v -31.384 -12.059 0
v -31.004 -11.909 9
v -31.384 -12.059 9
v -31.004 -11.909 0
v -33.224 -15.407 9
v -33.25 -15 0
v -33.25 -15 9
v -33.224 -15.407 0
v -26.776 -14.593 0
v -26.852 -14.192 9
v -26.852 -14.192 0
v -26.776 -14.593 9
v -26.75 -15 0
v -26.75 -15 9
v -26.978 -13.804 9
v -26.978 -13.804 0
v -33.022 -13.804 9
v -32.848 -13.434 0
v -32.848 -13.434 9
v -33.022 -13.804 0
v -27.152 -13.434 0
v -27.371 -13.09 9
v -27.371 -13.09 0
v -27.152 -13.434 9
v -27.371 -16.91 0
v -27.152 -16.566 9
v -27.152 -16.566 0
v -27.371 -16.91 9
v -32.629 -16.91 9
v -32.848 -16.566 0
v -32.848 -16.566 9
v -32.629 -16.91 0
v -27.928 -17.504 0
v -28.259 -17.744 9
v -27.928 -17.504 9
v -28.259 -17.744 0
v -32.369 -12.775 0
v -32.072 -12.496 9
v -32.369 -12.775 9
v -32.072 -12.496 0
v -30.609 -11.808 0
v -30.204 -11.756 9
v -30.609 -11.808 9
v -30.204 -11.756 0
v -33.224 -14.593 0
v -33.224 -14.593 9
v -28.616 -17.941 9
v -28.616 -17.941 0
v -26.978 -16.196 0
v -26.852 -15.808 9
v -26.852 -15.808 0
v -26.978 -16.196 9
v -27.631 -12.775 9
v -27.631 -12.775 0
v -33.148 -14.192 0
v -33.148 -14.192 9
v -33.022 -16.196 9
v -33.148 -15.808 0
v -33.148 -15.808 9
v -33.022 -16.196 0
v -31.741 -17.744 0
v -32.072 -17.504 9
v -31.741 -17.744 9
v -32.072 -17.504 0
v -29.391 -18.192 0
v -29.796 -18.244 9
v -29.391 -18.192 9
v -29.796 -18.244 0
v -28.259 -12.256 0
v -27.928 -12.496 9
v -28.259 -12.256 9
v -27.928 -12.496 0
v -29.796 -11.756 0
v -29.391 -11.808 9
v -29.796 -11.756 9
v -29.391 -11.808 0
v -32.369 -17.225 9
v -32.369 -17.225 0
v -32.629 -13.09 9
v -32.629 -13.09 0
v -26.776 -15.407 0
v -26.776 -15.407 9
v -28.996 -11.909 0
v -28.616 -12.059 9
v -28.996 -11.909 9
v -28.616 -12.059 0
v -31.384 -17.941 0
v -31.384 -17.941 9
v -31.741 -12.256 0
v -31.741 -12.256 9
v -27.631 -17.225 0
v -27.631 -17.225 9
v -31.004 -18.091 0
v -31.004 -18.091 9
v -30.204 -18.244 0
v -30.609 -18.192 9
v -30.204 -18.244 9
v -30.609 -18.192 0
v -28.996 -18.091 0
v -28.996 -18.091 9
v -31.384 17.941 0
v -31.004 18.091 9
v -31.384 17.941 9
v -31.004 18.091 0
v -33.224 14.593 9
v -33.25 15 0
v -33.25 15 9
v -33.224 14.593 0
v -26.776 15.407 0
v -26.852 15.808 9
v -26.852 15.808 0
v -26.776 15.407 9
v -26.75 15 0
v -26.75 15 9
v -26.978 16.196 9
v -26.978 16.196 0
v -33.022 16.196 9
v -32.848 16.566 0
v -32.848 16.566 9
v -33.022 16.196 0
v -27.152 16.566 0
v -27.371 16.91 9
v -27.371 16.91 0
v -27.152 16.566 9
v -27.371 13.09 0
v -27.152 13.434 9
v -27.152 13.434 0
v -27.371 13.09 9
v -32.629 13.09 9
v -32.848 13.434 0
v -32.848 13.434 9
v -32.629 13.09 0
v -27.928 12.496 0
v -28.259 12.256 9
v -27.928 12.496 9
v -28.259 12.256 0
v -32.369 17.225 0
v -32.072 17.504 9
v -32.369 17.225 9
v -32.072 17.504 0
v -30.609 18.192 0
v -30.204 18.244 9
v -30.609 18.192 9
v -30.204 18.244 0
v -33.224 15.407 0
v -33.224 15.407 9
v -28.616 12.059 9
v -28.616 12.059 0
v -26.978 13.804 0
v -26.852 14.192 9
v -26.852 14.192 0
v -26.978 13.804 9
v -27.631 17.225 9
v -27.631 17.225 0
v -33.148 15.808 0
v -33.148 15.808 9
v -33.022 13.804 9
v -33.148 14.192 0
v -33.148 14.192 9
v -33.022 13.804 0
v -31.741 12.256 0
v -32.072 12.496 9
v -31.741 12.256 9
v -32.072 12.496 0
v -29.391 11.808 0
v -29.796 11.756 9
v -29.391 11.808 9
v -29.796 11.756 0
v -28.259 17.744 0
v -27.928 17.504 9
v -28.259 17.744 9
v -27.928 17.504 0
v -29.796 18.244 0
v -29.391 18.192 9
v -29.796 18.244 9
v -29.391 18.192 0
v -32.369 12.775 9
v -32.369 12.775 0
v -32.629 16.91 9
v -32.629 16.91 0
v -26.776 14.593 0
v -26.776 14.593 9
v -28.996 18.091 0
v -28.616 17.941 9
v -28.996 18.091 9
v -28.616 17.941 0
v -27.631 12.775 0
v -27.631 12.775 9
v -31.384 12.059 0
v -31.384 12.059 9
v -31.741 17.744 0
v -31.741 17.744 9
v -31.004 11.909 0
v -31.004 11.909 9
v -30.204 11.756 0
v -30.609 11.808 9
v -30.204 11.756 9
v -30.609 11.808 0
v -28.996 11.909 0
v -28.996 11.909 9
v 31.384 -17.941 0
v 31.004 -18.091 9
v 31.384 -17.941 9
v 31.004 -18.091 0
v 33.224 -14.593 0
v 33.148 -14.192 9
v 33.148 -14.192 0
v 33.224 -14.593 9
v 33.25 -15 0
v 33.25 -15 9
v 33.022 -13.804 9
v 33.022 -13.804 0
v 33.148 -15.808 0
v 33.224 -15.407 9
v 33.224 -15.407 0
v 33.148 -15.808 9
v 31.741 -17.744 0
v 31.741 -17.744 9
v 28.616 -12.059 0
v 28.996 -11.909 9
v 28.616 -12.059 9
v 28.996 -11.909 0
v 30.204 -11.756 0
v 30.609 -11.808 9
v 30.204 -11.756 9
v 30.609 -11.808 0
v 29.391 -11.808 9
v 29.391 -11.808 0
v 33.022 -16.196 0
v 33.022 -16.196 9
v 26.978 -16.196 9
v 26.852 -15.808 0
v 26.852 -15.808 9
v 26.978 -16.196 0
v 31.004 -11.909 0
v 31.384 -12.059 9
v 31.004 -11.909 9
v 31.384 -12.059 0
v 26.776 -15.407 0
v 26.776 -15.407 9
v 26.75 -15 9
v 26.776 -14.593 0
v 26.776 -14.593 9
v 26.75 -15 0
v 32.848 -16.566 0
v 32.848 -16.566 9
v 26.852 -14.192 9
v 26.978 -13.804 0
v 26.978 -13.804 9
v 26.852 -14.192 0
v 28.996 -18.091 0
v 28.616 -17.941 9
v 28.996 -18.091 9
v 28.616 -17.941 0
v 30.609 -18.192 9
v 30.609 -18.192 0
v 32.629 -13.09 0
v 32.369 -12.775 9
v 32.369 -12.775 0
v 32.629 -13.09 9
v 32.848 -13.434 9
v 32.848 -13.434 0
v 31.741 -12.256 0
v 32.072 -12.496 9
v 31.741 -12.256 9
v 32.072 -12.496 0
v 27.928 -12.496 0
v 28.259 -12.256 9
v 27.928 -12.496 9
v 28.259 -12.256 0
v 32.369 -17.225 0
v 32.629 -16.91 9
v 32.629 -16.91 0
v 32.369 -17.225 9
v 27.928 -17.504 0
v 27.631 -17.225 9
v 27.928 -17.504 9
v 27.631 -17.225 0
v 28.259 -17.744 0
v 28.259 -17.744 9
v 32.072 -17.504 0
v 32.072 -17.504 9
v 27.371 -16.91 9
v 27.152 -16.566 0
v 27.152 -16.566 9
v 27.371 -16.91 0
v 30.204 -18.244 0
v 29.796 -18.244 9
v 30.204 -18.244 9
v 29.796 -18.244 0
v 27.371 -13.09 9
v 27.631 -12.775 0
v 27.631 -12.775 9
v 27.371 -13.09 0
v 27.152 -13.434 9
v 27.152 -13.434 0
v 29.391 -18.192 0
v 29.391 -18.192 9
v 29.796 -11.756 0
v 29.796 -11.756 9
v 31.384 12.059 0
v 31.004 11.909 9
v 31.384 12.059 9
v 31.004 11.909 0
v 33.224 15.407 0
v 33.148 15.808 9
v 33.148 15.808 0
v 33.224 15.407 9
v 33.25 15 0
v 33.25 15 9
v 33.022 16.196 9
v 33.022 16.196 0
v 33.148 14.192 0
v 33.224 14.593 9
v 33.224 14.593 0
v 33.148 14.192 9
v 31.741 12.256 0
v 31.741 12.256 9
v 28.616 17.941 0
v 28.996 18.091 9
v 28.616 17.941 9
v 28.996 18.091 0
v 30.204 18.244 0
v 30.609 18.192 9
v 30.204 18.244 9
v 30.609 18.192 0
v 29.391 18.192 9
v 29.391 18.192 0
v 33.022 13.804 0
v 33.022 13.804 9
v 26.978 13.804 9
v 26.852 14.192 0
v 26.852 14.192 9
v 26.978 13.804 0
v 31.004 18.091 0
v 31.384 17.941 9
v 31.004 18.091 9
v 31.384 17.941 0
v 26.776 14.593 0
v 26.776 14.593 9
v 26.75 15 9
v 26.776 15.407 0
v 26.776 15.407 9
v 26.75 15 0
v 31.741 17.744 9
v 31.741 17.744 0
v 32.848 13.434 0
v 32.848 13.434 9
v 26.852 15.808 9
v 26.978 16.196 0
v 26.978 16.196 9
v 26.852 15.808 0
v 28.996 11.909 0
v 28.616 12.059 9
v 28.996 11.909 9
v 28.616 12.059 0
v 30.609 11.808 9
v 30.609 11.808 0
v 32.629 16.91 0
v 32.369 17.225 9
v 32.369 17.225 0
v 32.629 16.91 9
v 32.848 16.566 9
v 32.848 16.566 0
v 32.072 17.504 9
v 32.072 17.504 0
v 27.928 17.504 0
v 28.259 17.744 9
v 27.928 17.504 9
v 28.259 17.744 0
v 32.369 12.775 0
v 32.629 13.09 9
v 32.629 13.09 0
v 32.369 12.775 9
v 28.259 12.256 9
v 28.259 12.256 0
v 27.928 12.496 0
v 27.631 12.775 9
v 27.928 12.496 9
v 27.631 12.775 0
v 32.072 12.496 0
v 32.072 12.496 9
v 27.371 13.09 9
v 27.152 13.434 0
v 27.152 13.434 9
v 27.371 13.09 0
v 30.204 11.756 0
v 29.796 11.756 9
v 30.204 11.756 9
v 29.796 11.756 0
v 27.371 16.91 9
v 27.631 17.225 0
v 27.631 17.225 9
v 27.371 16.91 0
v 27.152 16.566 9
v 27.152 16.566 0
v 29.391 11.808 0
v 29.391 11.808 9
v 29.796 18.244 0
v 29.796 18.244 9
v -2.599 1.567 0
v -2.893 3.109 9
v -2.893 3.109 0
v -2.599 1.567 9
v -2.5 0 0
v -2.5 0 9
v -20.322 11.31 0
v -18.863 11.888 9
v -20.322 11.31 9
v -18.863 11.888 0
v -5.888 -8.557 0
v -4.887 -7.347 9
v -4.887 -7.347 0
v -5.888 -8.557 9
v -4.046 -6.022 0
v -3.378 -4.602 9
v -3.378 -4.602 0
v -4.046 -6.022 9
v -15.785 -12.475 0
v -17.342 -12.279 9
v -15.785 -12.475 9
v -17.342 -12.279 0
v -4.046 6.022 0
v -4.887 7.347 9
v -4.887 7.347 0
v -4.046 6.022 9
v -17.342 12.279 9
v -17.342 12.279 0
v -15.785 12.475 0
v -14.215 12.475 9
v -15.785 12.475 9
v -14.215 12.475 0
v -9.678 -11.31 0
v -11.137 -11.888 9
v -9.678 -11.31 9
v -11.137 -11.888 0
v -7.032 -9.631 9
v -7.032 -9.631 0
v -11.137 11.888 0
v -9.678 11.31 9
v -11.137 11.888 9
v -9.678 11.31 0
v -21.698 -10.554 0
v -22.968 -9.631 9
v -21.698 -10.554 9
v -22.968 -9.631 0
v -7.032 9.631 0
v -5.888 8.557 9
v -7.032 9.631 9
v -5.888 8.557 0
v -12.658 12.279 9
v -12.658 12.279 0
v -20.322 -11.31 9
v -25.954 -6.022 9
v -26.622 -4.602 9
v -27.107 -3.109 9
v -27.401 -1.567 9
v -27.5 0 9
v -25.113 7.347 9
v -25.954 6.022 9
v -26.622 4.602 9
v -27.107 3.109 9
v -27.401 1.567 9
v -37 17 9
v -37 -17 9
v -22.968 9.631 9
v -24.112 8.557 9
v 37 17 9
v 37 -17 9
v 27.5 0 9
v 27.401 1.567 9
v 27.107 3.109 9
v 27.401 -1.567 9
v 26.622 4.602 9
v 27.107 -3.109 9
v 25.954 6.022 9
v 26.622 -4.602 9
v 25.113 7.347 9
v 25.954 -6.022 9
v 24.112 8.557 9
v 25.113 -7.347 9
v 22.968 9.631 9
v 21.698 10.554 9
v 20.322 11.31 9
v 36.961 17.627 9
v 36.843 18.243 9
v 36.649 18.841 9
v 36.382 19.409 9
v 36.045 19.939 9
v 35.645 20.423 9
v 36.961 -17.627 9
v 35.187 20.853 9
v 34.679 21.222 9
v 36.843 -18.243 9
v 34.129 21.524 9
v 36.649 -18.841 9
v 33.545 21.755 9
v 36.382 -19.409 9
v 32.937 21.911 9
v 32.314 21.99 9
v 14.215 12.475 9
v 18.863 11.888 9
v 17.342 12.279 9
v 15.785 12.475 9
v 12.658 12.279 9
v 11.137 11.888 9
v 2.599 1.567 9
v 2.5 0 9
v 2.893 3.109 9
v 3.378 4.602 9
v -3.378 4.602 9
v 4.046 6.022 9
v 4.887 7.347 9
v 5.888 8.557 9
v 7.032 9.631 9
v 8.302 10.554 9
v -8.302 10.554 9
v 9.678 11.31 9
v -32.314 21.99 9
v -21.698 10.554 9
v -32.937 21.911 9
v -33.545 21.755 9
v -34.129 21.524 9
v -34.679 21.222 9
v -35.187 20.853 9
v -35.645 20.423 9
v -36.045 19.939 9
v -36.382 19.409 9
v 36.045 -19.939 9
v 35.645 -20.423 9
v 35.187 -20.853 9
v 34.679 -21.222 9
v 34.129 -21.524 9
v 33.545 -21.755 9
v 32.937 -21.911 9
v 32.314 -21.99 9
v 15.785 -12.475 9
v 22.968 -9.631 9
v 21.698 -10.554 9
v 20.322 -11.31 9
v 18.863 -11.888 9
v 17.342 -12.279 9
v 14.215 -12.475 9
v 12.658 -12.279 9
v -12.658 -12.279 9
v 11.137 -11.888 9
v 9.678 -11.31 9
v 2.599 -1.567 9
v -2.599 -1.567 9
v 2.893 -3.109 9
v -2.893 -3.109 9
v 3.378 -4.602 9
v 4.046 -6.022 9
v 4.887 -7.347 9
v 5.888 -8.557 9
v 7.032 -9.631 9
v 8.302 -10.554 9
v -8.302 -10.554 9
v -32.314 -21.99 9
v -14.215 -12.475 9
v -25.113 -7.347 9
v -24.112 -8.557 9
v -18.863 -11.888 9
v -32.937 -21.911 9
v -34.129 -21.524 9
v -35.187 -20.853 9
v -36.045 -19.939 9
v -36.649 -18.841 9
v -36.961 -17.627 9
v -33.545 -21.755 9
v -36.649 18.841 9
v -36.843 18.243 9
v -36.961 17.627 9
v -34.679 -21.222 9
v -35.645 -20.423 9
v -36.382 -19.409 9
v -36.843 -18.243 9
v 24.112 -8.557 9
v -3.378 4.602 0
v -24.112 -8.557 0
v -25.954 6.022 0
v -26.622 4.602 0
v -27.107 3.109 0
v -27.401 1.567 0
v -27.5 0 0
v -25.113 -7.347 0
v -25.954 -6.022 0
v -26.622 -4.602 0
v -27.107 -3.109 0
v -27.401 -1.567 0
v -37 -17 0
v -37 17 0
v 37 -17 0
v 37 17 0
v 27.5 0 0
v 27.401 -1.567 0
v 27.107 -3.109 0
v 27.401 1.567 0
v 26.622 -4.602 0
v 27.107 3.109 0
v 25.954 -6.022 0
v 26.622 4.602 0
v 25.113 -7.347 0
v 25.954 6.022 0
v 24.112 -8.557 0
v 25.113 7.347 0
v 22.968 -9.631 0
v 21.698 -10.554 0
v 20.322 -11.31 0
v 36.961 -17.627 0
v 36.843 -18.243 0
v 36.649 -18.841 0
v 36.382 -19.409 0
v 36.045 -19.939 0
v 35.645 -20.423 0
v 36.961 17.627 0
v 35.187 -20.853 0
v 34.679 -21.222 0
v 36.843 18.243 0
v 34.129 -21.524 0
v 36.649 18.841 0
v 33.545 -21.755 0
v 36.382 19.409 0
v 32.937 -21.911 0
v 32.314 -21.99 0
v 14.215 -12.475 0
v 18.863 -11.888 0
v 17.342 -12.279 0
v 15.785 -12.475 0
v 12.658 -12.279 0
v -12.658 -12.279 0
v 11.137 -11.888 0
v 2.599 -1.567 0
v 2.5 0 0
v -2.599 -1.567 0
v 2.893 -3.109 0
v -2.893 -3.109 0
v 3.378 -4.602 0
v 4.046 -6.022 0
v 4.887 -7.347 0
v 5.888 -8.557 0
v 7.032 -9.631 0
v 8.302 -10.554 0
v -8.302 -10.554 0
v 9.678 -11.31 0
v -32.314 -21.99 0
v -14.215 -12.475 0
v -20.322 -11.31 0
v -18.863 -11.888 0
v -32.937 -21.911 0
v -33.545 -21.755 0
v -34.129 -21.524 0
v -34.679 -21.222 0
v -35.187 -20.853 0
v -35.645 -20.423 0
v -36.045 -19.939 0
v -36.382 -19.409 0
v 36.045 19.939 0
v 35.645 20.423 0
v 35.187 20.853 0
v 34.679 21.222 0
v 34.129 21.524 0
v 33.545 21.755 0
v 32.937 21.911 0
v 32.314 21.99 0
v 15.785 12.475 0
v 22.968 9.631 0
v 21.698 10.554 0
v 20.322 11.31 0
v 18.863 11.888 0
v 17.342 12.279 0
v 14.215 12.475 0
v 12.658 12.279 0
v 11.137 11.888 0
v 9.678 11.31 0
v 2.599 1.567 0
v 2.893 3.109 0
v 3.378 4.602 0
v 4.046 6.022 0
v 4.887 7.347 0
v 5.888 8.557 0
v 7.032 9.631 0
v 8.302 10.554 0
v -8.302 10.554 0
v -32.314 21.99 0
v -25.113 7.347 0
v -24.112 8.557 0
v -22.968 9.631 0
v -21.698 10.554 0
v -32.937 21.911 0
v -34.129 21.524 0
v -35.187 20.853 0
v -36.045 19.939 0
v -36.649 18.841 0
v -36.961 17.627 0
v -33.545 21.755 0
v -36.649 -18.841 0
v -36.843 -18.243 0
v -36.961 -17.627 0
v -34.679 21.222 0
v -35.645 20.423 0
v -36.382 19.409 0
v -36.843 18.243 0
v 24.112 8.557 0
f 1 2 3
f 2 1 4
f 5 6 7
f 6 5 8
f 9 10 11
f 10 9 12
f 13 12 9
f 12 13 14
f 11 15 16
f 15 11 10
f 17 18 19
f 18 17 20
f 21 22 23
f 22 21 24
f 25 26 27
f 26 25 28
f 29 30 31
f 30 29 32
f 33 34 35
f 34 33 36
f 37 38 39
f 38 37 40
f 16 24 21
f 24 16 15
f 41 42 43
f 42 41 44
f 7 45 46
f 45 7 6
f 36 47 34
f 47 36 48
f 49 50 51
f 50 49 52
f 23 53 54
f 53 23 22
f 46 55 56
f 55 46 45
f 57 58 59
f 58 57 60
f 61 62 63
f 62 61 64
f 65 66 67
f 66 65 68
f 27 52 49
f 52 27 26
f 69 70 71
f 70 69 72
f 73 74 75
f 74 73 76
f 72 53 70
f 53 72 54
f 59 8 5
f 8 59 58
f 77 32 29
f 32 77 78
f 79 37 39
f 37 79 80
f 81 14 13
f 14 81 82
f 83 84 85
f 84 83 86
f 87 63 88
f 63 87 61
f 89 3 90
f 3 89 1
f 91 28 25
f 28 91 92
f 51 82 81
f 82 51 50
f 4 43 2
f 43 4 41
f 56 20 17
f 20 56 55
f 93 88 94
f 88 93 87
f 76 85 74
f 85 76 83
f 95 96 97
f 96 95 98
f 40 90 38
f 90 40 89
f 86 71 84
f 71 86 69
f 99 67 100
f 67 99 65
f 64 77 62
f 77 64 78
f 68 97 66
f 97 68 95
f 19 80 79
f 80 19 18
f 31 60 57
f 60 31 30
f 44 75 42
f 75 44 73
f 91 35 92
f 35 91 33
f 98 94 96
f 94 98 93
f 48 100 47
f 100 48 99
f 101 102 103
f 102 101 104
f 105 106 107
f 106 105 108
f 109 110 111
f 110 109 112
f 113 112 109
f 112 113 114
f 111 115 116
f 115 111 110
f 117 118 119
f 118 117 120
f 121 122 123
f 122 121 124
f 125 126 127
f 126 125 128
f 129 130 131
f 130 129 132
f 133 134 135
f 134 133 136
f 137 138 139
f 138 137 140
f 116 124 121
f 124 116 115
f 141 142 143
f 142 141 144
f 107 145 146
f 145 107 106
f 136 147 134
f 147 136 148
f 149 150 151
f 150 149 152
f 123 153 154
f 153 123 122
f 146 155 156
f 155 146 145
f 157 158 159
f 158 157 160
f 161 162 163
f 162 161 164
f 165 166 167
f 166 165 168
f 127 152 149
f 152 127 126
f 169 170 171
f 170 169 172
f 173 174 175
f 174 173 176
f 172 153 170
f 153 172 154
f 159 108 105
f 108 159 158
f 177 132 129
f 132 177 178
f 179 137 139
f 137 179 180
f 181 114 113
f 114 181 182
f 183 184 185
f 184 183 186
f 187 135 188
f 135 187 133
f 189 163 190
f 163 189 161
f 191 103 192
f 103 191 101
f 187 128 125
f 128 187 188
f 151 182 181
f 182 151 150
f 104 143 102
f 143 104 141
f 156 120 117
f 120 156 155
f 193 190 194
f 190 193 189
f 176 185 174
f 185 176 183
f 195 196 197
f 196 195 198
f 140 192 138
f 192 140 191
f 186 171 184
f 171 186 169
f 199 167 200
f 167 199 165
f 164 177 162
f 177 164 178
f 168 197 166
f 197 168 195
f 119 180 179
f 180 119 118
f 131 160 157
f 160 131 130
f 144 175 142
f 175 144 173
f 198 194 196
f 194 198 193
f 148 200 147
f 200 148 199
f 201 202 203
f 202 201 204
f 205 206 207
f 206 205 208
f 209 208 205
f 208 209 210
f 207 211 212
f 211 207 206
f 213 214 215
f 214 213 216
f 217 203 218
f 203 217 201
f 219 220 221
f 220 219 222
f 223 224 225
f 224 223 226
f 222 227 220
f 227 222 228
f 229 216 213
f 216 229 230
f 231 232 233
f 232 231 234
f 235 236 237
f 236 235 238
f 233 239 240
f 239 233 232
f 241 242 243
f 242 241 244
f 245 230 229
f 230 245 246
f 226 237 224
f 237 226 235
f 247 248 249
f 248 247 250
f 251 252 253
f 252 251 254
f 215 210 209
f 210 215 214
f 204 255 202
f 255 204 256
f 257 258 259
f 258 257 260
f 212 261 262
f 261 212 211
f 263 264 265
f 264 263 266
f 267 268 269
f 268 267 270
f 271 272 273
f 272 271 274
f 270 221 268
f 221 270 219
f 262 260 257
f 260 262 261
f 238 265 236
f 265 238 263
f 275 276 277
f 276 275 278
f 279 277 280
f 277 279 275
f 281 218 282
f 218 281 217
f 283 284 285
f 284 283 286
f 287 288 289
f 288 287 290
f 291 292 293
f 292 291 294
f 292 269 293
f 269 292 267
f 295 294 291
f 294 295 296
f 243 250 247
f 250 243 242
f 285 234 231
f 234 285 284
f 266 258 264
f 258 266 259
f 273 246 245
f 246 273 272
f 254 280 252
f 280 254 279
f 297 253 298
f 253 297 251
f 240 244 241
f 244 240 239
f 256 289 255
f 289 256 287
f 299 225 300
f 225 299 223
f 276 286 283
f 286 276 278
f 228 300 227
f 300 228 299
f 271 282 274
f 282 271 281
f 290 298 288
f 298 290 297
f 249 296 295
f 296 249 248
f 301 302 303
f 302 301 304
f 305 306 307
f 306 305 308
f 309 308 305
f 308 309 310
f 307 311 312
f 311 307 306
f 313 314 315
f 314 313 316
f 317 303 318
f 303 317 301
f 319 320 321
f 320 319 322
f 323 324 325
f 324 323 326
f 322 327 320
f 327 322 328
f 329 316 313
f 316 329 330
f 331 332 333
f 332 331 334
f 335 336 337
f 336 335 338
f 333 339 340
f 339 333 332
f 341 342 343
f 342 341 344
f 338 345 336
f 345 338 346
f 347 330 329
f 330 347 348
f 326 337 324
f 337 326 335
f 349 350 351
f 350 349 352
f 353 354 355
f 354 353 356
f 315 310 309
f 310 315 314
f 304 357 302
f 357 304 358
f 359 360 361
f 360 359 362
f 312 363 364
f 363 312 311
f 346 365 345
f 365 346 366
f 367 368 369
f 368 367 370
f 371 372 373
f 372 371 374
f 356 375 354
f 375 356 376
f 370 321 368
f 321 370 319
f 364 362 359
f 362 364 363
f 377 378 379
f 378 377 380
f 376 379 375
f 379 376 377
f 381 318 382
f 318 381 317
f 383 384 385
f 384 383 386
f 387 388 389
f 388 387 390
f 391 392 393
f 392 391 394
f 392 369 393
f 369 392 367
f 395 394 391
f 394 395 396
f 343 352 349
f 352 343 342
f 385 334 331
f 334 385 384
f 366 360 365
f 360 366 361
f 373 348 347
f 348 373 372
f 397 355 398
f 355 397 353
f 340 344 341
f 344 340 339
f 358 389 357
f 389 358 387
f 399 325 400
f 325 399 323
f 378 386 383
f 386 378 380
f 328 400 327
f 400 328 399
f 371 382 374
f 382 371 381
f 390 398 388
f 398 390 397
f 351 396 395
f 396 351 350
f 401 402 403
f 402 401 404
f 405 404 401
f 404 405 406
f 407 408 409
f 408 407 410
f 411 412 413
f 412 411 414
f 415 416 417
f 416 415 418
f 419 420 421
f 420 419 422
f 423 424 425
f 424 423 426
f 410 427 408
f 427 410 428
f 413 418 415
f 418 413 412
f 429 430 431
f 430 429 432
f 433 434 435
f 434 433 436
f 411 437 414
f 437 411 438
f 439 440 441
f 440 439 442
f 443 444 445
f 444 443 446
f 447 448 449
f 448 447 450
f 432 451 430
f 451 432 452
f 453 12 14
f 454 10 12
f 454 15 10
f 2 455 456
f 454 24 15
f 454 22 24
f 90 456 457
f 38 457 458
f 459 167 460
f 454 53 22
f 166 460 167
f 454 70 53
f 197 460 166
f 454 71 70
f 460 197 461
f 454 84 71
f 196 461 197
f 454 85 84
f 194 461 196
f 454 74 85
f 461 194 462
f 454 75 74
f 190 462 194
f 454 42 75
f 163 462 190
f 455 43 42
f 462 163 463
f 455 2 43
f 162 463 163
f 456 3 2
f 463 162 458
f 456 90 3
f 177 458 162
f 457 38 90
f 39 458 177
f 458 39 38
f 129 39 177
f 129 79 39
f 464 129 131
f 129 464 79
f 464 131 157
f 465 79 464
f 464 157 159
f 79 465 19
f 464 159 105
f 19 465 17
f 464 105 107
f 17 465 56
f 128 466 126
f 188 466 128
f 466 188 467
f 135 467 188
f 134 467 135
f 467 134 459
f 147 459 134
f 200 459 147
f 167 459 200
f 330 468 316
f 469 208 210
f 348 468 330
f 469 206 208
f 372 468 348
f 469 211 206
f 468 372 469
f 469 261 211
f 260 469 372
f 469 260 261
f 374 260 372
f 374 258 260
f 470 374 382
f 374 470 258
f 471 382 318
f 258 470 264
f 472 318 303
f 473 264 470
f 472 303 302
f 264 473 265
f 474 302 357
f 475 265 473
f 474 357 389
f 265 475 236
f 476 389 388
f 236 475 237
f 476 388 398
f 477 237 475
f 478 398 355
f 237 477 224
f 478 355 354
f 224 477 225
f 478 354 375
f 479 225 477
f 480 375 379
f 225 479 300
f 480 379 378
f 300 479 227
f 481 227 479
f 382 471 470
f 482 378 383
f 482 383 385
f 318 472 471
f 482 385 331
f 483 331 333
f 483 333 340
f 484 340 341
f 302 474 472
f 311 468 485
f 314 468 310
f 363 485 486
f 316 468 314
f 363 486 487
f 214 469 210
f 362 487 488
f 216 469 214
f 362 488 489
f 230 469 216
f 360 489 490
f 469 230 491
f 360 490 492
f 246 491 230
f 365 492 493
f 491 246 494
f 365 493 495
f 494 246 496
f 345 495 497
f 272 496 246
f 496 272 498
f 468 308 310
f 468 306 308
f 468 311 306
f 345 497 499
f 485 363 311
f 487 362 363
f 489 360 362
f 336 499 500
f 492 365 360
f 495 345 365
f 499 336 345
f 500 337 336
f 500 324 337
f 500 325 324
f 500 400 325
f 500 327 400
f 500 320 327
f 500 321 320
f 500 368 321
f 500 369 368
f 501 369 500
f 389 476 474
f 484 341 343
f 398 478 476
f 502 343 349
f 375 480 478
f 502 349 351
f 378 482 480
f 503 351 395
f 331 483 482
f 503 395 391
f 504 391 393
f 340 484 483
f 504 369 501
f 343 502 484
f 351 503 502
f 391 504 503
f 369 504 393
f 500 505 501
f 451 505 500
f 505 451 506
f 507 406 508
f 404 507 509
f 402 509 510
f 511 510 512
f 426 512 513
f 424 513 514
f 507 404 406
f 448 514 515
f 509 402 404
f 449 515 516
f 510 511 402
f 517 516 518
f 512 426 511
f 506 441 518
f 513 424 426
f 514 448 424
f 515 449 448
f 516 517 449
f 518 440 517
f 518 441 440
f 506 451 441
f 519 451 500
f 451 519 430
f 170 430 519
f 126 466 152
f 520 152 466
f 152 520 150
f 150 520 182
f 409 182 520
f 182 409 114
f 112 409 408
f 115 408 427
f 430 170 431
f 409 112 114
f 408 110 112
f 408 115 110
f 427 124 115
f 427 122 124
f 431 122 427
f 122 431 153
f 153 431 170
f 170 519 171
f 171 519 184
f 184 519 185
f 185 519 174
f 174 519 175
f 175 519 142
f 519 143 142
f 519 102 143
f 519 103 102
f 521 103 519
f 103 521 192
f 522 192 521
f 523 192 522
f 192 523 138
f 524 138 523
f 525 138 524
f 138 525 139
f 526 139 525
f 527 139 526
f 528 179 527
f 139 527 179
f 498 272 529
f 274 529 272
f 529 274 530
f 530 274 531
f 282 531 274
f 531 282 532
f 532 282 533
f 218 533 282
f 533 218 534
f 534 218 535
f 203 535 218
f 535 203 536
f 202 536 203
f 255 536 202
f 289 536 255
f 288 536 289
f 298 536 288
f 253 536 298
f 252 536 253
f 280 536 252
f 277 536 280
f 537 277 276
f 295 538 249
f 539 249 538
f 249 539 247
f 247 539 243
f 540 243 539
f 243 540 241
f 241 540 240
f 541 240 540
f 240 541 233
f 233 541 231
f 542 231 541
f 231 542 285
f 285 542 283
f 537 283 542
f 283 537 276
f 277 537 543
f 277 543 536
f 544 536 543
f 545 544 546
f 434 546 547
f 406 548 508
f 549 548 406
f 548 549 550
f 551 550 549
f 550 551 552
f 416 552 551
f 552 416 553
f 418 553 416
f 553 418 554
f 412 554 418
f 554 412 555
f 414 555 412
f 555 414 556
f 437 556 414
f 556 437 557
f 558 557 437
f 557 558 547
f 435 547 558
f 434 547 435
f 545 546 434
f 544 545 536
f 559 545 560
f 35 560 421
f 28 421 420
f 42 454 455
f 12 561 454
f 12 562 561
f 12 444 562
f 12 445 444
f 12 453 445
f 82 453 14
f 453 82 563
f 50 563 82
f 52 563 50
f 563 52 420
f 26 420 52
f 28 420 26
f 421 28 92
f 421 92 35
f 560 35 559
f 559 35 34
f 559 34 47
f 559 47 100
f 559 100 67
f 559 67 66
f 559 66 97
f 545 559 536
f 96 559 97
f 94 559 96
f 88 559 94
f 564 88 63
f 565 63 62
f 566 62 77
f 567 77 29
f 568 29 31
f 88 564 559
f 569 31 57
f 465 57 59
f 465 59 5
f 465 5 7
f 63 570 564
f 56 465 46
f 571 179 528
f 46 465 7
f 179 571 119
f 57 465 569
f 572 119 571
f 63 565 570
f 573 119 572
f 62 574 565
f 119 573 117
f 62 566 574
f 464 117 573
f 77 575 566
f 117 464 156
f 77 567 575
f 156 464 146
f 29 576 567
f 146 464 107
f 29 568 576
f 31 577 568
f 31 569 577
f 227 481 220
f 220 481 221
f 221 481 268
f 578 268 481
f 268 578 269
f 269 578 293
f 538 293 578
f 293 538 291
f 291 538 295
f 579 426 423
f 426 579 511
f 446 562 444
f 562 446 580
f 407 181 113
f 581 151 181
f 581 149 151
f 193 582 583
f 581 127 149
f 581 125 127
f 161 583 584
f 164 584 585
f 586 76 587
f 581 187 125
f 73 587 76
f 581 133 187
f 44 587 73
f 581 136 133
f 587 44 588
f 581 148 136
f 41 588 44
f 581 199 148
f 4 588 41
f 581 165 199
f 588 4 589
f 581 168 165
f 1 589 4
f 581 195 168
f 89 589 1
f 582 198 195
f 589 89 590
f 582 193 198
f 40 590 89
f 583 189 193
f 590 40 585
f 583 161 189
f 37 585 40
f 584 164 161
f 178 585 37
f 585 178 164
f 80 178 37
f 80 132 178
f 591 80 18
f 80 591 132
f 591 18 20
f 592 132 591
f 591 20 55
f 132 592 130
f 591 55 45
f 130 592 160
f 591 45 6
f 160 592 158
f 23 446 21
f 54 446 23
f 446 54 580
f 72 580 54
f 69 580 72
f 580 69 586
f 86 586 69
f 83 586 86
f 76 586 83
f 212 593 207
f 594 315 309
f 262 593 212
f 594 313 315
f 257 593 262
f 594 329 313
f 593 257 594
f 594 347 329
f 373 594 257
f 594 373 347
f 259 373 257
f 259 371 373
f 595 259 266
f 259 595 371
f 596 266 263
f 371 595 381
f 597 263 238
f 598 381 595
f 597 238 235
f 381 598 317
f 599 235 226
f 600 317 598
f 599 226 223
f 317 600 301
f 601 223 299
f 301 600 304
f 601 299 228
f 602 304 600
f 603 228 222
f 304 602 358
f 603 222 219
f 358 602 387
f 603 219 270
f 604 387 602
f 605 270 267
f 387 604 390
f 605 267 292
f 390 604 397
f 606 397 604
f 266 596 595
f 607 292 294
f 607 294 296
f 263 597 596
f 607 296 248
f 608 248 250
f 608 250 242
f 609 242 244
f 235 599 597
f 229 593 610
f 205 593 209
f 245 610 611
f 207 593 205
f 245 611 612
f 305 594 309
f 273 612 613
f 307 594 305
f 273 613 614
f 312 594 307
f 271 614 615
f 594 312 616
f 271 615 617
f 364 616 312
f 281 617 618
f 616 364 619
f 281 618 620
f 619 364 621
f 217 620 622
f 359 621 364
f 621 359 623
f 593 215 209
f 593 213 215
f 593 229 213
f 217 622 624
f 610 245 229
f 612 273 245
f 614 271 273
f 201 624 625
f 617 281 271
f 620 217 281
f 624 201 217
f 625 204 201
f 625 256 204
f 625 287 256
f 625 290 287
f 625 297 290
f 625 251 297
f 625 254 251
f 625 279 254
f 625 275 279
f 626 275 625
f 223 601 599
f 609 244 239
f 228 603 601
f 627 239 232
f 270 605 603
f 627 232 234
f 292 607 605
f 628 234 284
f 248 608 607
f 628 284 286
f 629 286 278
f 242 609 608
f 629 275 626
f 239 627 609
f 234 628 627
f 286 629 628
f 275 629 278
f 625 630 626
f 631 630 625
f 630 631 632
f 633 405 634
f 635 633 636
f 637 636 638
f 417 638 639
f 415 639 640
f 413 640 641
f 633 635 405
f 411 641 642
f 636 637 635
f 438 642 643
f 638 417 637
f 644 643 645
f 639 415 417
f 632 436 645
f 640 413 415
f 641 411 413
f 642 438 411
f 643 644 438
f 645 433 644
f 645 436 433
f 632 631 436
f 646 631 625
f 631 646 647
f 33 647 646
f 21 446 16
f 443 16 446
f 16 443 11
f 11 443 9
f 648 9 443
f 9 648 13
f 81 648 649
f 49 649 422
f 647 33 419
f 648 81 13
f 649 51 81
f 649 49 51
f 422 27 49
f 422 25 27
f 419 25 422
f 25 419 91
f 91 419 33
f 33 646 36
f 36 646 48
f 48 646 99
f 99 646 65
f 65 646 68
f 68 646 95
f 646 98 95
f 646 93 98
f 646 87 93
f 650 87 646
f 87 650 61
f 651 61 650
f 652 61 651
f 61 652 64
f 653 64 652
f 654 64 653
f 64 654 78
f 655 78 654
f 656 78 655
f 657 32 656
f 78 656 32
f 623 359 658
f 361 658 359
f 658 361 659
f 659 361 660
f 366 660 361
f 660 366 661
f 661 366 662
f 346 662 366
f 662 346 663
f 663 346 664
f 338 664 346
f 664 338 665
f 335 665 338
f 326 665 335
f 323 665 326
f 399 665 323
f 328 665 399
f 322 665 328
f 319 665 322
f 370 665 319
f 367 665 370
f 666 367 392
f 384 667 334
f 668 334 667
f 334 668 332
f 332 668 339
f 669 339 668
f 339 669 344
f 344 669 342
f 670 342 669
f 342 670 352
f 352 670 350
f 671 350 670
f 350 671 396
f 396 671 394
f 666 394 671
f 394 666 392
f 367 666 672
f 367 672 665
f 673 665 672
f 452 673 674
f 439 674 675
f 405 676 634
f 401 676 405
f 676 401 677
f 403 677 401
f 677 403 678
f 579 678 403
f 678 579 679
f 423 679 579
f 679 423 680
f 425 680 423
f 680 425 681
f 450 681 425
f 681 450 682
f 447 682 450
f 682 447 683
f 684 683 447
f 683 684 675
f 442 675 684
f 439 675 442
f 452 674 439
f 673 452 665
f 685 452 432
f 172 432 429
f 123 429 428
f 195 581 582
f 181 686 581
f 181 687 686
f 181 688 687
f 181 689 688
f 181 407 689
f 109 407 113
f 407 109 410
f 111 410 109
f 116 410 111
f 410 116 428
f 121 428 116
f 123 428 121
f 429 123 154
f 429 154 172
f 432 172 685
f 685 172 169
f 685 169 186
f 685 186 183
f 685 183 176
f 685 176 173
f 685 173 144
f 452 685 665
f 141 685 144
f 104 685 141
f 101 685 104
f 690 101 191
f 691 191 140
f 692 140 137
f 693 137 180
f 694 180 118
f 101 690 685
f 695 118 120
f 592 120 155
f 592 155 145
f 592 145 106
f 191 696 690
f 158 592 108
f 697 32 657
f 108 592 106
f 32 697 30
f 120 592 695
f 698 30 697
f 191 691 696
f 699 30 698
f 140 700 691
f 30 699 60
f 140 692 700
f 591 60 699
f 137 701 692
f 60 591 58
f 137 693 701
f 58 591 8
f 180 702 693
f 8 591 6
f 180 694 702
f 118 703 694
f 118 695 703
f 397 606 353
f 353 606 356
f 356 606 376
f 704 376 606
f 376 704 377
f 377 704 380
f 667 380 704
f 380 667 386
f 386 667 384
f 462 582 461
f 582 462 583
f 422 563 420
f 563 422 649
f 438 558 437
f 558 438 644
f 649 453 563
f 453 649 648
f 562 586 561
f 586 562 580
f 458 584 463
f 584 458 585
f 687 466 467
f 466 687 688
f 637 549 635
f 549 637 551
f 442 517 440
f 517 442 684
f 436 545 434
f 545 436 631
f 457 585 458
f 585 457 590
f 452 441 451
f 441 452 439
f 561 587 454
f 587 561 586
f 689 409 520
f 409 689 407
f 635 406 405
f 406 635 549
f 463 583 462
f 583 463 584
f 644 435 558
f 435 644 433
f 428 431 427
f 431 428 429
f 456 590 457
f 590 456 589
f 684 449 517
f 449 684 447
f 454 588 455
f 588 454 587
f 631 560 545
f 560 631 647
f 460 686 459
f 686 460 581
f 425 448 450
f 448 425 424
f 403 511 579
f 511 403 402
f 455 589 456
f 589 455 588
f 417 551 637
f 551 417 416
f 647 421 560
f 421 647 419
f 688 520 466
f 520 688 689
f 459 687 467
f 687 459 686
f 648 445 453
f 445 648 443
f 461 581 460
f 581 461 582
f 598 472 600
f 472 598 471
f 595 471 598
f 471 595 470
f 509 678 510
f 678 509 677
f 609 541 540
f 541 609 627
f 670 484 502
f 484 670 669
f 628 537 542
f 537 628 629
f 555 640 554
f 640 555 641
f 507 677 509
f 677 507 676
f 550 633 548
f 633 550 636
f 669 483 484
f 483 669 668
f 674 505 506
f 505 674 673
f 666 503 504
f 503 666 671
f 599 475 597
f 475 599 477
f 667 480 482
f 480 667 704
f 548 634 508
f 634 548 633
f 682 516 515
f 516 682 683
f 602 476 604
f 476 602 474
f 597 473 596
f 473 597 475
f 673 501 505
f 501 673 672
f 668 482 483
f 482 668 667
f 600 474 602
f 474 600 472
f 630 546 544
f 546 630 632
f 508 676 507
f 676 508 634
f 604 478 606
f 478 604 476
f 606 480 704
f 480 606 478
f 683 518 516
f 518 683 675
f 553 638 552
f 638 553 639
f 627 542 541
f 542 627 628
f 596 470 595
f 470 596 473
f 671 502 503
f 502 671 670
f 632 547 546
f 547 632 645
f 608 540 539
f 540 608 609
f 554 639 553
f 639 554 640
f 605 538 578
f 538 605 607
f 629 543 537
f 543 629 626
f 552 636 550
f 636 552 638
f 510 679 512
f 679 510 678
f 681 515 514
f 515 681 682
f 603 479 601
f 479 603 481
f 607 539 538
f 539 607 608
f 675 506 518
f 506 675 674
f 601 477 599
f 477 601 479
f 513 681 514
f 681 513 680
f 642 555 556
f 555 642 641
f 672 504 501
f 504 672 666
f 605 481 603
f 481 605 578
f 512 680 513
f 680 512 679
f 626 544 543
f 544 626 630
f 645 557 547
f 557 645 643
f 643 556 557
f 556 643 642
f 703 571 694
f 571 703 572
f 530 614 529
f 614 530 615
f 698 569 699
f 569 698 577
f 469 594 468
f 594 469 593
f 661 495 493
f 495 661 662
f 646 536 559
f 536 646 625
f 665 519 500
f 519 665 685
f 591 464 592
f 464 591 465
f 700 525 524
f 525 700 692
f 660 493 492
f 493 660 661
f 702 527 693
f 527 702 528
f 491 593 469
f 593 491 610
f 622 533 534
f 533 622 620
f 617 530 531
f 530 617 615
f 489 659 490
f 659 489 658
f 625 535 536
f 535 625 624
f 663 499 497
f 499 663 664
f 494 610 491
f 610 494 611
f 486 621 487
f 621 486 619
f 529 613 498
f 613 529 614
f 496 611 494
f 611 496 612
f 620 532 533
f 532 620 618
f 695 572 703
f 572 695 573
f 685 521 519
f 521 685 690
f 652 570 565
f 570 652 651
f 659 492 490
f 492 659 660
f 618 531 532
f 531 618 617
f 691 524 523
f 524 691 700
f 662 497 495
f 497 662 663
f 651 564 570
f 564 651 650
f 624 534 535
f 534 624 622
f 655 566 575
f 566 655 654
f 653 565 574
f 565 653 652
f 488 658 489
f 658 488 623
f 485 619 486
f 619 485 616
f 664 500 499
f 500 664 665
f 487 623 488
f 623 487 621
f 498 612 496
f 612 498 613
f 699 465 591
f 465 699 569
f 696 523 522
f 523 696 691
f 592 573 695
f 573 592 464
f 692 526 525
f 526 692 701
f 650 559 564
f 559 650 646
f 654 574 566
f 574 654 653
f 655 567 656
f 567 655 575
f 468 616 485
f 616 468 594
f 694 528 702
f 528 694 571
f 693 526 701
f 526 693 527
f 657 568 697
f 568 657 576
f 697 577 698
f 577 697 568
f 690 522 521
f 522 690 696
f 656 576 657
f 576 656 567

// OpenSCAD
$fn = 50;


difference() {
	union() {
		hull() {
			translate(v = [-32.0000000000, 17.0000000000, 0]) {
				cylinder(h = 9, r = 5);
			}
			translate(v = [32.0000000000, 17.0000000000, 0]) {
				cylinder(h = 9, r = 5);
			}
			translate(v = [-32.0000000000, -17.0000000000, 0]) {
				cylinder(h = 9, r = 5);
			}
			translate(v = [32.0000000000, -17.0000000000, 0]) {
				cylinder(h = 9, r = 5);
			}
		}
	}
	union() {
		#translate(v = [-30.0000000000, -15.0000000000, -100.0000000000]) {
			cylinder(h = 200, r = 3.2500000000);
		}
		#translate(v = [-30.0000000000, 15.0000000000, -100.0000000000]) {
			cylinder(h = 200, r = 3.2500000000);
		}
		#translate(v = [30.0000000000, -15.0000000000, -100.0000000000]) {
			cylinder(h = 200, r = 3.2500000000);
		}
		#translate(v = [30.0000000000, 15.0000000000, -100.0000000000]) {
			cylinder(h = 200, r = 3.2500000000);
		}
		#translate(v = [-15.0000000000, 0, 0]) {
			cylinder(h = 9, r = 12.5000000000);
		}
		#translate(v = [15.0000000000, 0, 0]) {
			cylinder(h = 9, r = 12.5000000000);
		}
	}
}
